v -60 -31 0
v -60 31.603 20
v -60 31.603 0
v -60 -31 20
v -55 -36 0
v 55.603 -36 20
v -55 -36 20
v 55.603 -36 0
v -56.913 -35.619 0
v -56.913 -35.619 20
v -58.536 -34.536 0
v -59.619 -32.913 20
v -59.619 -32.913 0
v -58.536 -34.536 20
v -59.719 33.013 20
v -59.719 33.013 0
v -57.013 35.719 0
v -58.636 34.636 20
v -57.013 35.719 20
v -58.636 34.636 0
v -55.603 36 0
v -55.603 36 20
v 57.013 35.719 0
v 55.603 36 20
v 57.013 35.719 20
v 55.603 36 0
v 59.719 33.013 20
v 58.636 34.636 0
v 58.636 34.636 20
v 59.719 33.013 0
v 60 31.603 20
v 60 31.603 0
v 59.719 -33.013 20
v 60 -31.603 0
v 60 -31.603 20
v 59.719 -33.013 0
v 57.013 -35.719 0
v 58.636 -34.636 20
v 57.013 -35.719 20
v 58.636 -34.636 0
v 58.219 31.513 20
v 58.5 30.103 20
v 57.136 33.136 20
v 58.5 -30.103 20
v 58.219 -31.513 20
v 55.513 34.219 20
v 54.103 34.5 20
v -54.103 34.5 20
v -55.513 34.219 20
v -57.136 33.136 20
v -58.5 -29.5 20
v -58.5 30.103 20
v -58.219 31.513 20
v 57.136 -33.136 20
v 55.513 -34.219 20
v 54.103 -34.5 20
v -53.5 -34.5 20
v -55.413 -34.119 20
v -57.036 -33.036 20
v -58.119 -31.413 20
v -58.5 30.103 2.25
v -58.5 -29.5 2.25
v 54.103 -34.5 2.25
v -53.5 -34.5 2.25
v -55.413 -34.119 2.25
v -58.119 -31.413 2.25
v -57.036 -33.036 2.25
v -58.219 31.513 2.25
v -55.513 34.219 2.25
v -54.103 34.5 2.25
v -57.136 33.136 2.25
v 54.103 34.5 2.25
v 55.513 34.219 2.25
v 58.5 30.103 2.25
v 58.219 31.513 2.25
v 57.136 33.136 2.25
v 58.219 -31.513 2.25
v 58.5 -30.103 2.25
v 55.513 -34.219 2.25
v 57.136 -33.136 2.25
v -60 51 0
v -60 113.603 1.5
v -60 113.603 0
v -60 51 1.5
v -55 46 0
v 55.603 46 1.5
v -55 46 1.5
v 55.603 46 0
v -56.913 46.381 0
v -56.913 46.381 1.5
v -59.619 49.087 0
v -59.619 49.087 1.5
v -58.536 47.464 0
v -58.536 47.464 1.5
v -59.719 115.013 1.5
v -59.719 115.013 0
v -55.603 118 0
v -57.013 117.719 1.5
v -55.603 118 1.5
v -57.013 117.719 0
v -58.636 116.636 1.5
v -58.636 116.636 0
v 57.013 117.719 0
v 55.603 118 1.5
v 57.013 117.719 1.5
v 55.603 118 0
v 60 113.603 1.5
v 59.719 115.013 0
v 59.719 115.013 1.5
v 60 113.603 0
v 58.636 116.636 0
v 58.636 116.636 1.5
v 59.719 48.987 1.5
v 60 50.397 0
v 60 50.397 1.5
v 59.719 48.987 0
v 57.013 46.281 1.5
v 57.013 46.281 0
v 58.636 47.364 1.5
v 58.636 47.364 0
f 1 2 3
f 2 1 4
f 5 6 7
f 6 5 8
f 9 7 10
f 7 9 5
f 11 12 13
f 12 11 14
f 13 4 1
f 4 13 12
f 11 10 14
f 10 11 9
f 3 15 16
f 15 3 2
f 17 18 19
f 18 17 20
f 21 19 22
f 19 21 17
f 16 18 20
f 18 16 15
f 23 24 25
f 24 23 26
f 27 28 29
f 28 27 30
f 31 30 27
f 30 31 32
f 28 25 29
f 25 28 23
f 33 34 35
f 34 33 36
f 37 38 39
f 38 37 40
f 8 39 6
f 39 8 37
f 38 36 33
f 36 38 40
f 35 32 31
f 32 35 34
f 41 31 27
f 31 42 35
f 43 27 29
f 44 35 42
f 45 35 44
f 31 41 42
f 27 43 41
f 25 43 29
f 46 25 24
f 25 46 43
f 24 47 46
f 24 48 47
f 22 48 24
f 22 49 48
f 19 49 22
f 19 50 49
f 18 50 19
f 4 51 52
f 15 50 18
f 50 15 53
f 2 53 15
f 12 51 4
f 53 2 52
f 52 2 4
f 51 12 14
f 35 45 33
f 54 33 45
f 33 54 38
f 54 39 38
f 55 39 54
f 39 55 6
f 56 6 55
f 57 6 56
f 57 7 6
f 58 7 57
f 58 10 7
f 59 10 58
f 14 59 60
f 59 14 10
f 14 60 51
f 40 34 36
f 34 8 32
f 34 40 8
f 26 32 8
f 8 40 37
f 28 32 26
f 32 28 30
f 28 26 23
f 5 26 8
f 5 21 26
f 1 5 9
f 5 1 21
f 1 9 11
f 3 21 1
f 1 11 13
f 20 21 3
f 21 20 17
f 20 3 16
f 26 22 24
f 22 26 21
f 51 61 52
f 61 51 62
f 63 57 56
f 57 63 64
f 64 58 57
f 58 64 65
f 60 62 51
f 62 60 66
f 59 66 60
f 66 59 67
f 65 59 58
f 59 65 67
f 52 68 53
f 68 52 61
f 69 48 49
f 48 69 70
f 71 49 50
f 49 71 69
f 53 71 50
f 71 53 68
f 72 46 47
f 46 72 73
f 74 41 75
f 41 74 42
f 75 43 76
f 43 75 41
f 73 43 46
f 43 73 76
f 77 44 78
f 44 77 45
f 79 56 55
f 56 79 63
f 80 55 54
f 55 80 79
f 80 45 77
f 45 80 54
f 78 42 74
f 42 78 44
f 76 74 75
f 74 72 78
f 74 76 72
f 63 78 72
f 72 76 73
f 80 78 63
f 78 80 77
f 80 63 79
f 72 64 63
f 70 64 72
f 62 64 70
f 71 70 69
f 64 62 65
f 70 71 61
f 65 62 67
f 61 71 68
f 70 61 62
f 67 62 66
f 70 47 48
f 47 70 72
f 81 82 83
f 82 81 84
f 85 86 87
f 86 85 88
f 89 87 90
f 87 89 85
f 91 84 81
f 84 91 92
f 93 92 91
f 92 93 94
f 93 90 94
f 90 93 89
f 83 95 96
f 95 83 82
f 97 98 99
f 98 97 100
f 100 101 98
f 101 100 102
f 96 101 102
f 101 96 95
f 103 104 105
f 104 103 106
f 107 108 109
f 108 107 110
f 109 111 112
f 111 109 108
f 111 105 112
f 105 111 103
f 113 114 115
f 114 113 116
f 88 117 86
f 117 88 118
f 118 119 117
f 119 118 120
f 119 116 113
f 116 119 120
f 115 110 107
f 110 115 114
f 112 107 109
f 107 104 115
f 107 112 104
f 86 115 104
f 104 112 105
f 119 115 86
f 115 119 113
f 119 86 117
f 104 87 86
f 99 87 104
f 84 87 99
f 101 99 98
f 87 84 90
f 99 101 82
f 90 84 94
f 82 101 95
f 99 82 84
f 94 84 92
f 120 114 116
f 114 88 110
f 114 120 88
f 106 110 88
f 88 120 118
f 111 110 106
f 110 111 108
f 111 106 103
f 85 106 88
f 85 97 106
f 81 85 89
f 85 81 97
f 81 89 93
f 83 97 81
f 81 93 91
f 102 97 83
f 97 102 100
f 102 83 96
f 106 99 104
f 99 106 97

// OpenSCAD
//
// Customized Enclosure
//

/*[Dimensions]*/

// Width of the enclosure
width = 120.0;
// Height of the enclosure
height = 72.0;
// Depth of the enclosure
depth = 20.0;
// Thickness of the walls and lid
thickness = 1.5;
// Amount of corner rounding
fillet_radius = 5.0;

// 
// builds a solid rectangle with rounded corners (Z-only)
//
module block(width, height, depth, fillet_radius) {
    
    difference() {
        cube([width, height, depth], center = true);
        
        fudge = 0.1;
        fudge_depth = depth + 1.0;
        
        translate([-(width / 2), -(height / 2), -(fudge_depth / 2)])
        intersection () {
            cube([fillet_radius, fillet_radius, fudge_depth], center = false); 
            difference() {
                    cube([2 * fillet_radius, 2 * fillet_radius, fudge_depth], center = false); 
                    translate([fillet_radius, fillet_radius, 0.0])
                    cylinder(r = fillet_radius, h = fudge_depth);
            }
        }

        translate([-(width / 2 + fudge), (height / 2 + fudge), -(fudge_depth / 2)])
        rotate([0.0, 0.0, -90])
        intersection () {
            cube([fillet_radius, fillet_radius, fudge_depth], center = false); 
            difference() {
                    cube([2 * fillet_radius, 2 * fillet_radius, fudge_depth], center = false); 
                    translate([fillet_radius, fillet_radius, 0.0])
                    cylinder(r = fillet_radius, h = fudge_depth);
            }
        }

        translate([(width / 2 + fudge), (height / 2 + fudge), -(fudge_depth / 2)])
        rotate([0.0, 0.0, 180])
        intersection () {
            cube([fillet_radius, fillet_radius, fudge_depth], center = false); 
            difference() {
                    cube([2 * fillet_radius, 2 * fillet_radius, fudge_depth], center = false); 
                    translate([fillet_radius, fillet_radius, 0.0])
                    cylinder(r = fillet_radius, h = fudge_depth);
            }
        }

        translate([(width / 2 + fudge), -(height / 2 + fudge), -(fudge_depth / 2)])
        rotate([0.0, 0.0, 90])
        intersection () {
            cube([fillet_radius, fillet_radius, fudge_depth], center = false); 
            difference() {
                    cube([2 * fillet_radius, 2 * fillet_radius, fudge_depth], center = false); 
                    translate([fillet_radius, fillet_radius, 0.0])
                    cylinder(r = fillet_radius, h = fudge_depth);
            }
        }
    }
}

module enclosure(width, height, depth, fillet_radius, thickness) {
    translate([0.0, 0.0, depth / 2.0])
    difference() {
        block(width, height, depth, fillet_radius);
        translate([0.0, 0.0, thickness]) 
            block(width - (2 * thickness), height - (2 * thickness), depth - thickness, fillet_radius);
    }
}

module lid(width, height, fillet_radius, thickness) {
    translate([0.0, height + 10, thickness / 2.0])
        block(width, height, thickness, fillet_radius);
}

enclosure(width, height, depth, fillet_radius, thickness);
lid(width, height, fillet_radius, thickness);
